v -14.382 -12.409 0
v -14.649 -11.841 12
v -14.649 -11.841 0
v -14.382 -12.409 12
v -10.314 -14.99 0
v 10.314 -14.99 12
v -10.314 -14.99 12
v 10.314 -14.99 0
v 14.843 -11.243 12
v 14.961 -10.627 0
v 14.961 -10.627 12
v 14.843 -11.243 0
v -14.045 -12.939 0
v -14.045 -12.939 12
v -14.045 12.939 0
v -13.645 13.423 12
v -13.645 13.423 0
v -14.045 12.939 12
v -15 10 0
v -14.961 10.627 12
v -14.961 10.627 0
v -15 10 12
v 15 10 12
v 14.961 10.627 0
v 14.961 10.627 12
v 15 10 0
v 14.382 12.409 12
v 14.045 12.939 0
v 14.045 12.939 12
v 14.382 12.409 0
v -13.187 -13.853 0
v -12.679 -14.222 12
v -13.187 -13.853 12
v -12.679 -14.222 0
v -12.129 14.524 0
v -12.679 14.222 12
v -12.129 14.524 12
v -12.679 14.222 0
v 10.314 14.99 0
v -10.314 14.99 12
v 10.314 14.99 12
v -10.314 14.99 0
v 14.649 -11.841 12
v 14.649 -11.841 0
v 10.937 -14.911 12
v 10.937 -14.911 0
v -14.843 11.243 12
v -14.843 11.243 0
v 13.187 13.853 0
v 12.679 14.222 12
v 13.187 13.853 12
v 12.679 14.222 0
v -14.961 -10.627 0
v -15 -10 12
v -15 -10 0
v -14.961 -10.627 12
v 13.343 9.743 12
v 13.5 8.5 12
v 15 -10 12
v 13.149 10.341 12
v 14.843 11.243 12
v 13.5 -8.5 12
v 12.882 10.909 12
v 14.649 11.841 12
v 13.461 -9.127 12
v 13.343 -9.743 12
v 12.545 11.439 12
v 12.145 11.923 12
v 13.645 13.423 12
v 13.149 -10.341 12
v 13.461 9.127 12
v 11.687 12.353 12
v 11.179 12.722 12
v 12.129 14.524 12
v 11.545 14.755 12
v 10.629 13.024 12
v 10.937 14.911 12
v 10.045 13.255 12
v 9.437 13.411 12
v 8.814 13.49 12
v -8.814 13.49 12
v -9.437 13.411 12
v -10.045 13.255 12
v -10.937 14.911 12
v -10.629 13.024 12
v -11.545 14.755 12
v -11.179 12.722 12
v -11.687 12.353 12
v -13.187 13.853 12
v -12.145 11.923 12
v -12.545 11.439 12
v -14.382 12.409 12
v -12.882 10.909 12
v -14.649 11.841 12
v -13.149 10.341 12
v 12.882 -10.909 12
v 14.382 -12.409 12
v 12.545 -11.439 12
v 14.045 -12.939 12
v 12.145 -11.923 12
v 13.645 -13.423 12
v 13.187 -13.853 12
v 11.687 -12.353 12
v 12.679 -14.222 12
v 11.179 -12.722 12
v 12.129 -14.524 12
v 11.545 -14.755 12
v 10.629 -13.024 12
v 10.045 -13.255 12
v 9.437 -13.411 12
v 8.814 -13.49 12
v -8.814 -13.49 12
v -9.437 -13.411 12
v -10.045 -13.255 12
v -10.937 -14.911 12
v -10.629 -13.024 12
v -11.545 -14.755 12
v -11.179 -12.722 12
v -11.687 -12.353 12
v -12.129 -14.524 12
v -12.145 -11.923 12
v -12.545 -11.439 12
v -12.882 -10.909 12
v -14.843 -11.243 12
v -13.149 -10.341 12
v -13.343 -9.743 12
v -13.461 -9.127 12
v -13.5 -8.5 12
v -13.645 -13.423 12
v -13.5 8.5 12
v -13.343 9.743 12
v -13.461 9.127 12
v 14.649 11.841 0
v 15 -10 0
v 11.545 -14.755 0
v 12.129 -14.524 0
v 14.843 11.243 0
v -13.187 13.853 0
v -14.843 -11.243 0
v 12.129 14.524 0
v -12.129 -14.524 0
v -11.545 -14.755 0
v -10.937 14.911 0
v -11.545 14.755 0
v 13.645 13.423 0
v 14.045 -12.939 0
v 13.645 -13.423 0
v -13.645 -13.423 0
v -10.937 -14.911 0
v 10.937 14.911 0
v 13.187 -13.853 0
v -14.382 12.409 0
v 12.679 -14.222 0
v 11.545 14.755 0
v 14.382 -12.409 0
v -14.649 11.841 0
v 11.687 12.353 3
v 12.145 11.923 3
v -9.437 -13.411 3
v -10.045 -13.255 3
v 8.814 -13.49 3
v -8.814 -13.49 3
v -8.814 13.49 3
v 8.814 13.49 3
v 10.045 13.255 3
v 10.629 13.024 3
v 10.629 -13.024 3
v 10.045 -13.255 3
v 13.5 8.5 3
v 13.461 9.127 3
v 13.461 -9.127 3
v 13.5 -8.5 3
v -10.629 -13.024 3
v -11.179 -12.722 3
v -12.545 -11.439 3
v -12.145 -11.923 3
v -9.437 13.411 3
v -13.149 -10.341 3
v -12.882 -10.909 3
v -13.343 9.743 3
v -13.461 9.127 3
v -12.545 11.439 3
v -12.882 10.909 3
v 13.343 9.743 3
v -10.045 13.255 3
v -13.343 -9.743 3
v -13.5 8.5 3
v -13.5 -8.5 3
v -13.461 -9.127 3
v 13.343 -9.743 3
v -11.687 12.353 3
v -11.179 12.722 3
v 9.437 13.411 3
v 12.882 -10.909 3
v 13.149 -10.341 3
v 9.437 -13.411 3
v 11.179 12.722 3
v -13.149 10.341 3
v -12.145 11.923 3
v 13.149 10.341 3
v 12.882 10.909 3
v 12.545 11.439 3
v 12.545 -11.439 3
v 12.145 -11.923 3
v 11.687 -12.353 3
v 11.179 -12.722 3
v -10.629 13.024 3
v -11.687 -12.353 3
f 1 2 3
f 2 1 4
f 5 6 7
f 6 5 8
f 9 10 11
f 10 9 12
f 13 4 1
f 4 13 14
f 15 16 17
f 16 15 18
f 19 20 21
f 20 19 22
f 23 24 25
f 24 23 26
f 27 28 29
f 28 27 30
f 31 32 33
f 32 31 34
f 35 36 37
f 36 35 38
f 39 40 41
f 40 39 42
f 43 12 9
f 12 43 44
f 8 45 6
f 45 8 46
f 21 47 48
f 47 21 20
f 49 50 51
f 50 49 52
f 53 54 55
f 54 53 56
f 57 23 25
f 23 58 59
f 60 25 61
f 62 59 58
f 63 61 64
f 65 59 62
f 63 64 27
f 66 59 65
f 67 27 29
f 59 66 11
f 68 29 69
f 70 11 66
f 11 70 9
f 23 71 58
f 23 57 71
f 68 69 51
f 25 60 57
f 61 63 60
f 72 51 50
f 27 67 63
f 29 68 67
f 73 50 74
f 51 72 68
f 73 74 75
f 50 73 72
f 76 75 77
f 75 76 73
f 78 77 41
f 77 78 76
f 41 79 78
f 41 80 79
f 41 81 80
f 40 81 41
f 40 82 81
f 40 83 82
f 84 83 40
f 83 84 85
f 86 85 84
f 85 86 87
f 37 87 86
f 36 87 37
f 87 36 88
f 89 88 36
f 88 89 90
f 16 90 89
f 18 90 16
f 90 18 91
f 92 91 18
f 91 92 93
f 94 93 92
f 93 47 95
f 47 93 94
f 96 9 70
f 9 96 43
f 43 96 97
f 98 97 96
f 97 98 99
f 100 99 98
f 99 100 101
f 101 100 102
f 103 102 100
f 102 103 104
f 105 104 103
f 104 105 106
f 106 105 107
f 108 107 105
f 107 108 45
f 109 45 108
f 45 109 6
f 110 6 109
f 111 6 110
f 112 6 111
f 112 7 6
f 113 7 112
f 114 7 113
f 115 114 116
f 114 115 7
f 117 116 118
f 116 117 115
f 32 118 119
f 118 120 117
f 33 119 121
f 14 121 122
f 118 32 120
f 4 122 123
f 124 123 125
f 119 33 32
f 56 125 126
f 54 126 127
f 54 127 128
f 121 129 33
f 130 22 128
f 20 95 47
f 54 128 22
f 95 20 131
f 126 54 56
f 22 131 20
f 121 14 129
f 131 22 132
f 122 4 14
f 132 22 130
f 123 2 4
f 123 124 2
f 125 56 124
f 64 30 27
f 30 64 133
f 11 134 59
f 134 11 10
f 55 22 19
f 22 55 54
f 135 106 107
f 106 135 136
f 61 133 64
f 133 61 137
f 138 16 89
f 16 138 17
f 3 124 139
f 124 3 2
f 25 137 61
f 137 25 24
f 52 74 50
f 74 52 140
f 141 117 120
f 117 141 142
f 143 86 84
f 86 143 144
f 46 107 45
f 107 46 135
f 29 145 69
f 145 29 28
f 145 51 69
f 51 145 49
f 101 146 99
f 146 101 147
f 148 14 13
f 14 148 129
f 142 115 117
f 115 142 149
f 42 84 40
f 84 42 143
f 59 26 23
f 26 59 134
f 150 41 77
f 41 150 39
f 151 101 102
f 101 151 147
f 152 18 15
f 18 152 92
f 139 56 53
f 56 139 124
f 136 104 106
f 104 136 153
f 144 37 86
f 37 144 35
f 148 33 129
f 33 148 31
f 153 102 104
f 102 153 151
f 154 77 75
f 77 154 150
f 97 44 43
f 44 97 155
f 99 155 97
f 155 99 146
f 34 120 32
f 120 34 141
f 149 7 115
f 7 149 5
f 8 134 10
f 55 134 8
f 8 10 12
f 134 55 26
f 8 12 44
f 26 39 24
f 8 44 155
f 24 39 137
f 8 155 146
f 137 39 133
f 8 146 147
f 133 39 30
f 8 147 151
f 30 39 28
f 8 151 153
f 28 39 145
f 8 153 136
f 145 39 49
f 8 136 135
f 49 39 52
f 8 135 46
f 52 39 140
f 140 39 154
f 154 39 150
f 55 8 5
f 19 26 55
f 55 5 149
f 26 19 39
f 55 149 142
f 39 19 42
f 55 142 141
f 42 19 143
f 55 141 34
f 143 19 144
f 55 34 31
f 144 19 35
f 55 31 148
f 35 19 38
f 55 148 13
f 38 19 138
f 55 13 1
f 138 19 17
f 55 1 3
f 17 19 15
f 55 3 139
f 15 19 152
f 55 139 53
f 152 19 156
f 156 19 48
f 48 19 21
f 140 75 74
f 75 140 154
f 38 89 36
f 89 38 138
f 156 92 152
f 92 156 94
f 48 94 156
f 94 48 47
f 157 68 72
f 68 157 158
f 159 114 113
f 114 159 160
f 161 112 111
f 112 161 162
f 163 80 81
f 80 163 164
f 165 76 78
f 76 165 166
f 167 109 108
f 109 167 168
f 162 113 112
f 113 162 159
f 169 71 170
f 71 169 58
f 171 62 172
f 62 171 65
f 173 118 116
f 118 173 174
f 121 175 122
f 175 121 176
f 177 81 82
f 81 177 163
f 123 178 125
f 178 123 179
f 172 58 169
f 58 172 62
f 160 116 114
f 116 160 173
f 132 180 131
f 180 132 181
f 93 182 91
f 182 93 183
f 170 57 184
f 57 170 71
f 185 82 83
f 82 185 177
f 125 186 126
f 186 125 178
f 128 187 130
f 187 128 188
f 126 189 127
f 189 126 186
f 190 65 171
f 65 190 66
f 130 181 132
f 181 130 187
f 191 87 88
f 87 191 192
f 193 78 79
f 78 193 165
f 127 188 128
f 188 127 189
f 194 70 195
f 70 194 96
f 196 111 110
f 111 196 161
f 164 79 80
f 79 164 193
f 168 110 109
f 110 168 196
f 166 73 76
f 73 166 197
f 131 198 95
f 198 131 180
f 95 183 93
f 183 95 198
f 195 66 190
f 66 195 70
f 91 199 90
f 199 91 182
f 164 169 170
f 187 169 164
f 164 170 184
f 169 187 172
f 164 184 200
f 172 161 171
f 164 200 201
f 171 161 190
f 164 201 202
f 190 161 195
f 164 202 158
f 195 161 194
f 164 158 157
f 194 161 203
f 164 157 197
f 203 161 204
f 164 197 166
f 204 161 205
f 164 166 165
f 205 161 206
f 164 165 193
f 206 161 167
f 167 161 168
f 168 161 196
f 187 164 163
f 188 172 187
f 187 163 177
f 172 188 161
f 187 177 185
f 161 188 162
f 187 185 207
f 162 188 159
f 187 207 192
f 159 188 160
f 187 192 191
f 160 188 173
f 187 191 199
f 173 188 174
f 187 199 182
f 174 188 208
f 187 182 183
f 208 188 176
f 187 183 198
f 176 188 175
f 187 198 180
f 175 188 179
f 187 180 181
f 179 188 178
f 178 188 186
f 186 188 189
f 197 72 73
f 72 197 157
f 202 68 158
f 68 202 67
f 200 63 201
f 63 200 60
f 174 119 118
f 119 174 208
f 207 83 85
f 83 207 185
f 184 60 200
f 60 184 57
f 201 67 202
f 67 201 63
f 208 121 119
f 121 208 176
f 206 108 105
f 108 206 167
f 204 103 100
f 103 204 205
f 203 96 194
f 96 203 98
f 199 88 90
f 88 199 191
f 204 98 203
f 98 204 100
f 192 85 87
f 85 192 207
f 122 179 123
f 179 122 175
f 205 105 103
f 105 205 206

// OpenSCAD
$fn = 50;


difference() {
	union() {
		hull() {
			translate(v = [-10.0000000000, 10.0000000000, 0]) {
				cylinder(h = 12, r = 5);
			}
			translate(v = [10.0000000000, 10.0000000000, 0]) {
				cylinder(h = 12, r = 5);
			}
			translate(v = [-10.0000000000, -10.0000000000, 0]) {
				cylinder(h = 12, r = 5);
			}
			translate(v = [10.0000000000, -10.0000000000, 0]) {
				cylinder(h = 12, r = 5);
			}
		}
	}
	union() {
		translate(v = [0, 0, 3]) {
			#hull() {
				translate(v = [-8.5000000000, 8.5000000000, 0]) {
					cylinder(h = 9, r = 5);
				}
				translate(v = [8.5000000000, 8.5000000000, 0]) {
					cylinder(h = 9, r = 5);
				}
				translate(v = [-8.5000000000, -8.5000000000, 0]) {
					cylinder(h = 9, r = 5);
				}
				translate(v = [8.5000000000, -8.5000000000, 0]) {
					cylinder(h = 9, r = 5);
				}
			}
		}
	}
}
